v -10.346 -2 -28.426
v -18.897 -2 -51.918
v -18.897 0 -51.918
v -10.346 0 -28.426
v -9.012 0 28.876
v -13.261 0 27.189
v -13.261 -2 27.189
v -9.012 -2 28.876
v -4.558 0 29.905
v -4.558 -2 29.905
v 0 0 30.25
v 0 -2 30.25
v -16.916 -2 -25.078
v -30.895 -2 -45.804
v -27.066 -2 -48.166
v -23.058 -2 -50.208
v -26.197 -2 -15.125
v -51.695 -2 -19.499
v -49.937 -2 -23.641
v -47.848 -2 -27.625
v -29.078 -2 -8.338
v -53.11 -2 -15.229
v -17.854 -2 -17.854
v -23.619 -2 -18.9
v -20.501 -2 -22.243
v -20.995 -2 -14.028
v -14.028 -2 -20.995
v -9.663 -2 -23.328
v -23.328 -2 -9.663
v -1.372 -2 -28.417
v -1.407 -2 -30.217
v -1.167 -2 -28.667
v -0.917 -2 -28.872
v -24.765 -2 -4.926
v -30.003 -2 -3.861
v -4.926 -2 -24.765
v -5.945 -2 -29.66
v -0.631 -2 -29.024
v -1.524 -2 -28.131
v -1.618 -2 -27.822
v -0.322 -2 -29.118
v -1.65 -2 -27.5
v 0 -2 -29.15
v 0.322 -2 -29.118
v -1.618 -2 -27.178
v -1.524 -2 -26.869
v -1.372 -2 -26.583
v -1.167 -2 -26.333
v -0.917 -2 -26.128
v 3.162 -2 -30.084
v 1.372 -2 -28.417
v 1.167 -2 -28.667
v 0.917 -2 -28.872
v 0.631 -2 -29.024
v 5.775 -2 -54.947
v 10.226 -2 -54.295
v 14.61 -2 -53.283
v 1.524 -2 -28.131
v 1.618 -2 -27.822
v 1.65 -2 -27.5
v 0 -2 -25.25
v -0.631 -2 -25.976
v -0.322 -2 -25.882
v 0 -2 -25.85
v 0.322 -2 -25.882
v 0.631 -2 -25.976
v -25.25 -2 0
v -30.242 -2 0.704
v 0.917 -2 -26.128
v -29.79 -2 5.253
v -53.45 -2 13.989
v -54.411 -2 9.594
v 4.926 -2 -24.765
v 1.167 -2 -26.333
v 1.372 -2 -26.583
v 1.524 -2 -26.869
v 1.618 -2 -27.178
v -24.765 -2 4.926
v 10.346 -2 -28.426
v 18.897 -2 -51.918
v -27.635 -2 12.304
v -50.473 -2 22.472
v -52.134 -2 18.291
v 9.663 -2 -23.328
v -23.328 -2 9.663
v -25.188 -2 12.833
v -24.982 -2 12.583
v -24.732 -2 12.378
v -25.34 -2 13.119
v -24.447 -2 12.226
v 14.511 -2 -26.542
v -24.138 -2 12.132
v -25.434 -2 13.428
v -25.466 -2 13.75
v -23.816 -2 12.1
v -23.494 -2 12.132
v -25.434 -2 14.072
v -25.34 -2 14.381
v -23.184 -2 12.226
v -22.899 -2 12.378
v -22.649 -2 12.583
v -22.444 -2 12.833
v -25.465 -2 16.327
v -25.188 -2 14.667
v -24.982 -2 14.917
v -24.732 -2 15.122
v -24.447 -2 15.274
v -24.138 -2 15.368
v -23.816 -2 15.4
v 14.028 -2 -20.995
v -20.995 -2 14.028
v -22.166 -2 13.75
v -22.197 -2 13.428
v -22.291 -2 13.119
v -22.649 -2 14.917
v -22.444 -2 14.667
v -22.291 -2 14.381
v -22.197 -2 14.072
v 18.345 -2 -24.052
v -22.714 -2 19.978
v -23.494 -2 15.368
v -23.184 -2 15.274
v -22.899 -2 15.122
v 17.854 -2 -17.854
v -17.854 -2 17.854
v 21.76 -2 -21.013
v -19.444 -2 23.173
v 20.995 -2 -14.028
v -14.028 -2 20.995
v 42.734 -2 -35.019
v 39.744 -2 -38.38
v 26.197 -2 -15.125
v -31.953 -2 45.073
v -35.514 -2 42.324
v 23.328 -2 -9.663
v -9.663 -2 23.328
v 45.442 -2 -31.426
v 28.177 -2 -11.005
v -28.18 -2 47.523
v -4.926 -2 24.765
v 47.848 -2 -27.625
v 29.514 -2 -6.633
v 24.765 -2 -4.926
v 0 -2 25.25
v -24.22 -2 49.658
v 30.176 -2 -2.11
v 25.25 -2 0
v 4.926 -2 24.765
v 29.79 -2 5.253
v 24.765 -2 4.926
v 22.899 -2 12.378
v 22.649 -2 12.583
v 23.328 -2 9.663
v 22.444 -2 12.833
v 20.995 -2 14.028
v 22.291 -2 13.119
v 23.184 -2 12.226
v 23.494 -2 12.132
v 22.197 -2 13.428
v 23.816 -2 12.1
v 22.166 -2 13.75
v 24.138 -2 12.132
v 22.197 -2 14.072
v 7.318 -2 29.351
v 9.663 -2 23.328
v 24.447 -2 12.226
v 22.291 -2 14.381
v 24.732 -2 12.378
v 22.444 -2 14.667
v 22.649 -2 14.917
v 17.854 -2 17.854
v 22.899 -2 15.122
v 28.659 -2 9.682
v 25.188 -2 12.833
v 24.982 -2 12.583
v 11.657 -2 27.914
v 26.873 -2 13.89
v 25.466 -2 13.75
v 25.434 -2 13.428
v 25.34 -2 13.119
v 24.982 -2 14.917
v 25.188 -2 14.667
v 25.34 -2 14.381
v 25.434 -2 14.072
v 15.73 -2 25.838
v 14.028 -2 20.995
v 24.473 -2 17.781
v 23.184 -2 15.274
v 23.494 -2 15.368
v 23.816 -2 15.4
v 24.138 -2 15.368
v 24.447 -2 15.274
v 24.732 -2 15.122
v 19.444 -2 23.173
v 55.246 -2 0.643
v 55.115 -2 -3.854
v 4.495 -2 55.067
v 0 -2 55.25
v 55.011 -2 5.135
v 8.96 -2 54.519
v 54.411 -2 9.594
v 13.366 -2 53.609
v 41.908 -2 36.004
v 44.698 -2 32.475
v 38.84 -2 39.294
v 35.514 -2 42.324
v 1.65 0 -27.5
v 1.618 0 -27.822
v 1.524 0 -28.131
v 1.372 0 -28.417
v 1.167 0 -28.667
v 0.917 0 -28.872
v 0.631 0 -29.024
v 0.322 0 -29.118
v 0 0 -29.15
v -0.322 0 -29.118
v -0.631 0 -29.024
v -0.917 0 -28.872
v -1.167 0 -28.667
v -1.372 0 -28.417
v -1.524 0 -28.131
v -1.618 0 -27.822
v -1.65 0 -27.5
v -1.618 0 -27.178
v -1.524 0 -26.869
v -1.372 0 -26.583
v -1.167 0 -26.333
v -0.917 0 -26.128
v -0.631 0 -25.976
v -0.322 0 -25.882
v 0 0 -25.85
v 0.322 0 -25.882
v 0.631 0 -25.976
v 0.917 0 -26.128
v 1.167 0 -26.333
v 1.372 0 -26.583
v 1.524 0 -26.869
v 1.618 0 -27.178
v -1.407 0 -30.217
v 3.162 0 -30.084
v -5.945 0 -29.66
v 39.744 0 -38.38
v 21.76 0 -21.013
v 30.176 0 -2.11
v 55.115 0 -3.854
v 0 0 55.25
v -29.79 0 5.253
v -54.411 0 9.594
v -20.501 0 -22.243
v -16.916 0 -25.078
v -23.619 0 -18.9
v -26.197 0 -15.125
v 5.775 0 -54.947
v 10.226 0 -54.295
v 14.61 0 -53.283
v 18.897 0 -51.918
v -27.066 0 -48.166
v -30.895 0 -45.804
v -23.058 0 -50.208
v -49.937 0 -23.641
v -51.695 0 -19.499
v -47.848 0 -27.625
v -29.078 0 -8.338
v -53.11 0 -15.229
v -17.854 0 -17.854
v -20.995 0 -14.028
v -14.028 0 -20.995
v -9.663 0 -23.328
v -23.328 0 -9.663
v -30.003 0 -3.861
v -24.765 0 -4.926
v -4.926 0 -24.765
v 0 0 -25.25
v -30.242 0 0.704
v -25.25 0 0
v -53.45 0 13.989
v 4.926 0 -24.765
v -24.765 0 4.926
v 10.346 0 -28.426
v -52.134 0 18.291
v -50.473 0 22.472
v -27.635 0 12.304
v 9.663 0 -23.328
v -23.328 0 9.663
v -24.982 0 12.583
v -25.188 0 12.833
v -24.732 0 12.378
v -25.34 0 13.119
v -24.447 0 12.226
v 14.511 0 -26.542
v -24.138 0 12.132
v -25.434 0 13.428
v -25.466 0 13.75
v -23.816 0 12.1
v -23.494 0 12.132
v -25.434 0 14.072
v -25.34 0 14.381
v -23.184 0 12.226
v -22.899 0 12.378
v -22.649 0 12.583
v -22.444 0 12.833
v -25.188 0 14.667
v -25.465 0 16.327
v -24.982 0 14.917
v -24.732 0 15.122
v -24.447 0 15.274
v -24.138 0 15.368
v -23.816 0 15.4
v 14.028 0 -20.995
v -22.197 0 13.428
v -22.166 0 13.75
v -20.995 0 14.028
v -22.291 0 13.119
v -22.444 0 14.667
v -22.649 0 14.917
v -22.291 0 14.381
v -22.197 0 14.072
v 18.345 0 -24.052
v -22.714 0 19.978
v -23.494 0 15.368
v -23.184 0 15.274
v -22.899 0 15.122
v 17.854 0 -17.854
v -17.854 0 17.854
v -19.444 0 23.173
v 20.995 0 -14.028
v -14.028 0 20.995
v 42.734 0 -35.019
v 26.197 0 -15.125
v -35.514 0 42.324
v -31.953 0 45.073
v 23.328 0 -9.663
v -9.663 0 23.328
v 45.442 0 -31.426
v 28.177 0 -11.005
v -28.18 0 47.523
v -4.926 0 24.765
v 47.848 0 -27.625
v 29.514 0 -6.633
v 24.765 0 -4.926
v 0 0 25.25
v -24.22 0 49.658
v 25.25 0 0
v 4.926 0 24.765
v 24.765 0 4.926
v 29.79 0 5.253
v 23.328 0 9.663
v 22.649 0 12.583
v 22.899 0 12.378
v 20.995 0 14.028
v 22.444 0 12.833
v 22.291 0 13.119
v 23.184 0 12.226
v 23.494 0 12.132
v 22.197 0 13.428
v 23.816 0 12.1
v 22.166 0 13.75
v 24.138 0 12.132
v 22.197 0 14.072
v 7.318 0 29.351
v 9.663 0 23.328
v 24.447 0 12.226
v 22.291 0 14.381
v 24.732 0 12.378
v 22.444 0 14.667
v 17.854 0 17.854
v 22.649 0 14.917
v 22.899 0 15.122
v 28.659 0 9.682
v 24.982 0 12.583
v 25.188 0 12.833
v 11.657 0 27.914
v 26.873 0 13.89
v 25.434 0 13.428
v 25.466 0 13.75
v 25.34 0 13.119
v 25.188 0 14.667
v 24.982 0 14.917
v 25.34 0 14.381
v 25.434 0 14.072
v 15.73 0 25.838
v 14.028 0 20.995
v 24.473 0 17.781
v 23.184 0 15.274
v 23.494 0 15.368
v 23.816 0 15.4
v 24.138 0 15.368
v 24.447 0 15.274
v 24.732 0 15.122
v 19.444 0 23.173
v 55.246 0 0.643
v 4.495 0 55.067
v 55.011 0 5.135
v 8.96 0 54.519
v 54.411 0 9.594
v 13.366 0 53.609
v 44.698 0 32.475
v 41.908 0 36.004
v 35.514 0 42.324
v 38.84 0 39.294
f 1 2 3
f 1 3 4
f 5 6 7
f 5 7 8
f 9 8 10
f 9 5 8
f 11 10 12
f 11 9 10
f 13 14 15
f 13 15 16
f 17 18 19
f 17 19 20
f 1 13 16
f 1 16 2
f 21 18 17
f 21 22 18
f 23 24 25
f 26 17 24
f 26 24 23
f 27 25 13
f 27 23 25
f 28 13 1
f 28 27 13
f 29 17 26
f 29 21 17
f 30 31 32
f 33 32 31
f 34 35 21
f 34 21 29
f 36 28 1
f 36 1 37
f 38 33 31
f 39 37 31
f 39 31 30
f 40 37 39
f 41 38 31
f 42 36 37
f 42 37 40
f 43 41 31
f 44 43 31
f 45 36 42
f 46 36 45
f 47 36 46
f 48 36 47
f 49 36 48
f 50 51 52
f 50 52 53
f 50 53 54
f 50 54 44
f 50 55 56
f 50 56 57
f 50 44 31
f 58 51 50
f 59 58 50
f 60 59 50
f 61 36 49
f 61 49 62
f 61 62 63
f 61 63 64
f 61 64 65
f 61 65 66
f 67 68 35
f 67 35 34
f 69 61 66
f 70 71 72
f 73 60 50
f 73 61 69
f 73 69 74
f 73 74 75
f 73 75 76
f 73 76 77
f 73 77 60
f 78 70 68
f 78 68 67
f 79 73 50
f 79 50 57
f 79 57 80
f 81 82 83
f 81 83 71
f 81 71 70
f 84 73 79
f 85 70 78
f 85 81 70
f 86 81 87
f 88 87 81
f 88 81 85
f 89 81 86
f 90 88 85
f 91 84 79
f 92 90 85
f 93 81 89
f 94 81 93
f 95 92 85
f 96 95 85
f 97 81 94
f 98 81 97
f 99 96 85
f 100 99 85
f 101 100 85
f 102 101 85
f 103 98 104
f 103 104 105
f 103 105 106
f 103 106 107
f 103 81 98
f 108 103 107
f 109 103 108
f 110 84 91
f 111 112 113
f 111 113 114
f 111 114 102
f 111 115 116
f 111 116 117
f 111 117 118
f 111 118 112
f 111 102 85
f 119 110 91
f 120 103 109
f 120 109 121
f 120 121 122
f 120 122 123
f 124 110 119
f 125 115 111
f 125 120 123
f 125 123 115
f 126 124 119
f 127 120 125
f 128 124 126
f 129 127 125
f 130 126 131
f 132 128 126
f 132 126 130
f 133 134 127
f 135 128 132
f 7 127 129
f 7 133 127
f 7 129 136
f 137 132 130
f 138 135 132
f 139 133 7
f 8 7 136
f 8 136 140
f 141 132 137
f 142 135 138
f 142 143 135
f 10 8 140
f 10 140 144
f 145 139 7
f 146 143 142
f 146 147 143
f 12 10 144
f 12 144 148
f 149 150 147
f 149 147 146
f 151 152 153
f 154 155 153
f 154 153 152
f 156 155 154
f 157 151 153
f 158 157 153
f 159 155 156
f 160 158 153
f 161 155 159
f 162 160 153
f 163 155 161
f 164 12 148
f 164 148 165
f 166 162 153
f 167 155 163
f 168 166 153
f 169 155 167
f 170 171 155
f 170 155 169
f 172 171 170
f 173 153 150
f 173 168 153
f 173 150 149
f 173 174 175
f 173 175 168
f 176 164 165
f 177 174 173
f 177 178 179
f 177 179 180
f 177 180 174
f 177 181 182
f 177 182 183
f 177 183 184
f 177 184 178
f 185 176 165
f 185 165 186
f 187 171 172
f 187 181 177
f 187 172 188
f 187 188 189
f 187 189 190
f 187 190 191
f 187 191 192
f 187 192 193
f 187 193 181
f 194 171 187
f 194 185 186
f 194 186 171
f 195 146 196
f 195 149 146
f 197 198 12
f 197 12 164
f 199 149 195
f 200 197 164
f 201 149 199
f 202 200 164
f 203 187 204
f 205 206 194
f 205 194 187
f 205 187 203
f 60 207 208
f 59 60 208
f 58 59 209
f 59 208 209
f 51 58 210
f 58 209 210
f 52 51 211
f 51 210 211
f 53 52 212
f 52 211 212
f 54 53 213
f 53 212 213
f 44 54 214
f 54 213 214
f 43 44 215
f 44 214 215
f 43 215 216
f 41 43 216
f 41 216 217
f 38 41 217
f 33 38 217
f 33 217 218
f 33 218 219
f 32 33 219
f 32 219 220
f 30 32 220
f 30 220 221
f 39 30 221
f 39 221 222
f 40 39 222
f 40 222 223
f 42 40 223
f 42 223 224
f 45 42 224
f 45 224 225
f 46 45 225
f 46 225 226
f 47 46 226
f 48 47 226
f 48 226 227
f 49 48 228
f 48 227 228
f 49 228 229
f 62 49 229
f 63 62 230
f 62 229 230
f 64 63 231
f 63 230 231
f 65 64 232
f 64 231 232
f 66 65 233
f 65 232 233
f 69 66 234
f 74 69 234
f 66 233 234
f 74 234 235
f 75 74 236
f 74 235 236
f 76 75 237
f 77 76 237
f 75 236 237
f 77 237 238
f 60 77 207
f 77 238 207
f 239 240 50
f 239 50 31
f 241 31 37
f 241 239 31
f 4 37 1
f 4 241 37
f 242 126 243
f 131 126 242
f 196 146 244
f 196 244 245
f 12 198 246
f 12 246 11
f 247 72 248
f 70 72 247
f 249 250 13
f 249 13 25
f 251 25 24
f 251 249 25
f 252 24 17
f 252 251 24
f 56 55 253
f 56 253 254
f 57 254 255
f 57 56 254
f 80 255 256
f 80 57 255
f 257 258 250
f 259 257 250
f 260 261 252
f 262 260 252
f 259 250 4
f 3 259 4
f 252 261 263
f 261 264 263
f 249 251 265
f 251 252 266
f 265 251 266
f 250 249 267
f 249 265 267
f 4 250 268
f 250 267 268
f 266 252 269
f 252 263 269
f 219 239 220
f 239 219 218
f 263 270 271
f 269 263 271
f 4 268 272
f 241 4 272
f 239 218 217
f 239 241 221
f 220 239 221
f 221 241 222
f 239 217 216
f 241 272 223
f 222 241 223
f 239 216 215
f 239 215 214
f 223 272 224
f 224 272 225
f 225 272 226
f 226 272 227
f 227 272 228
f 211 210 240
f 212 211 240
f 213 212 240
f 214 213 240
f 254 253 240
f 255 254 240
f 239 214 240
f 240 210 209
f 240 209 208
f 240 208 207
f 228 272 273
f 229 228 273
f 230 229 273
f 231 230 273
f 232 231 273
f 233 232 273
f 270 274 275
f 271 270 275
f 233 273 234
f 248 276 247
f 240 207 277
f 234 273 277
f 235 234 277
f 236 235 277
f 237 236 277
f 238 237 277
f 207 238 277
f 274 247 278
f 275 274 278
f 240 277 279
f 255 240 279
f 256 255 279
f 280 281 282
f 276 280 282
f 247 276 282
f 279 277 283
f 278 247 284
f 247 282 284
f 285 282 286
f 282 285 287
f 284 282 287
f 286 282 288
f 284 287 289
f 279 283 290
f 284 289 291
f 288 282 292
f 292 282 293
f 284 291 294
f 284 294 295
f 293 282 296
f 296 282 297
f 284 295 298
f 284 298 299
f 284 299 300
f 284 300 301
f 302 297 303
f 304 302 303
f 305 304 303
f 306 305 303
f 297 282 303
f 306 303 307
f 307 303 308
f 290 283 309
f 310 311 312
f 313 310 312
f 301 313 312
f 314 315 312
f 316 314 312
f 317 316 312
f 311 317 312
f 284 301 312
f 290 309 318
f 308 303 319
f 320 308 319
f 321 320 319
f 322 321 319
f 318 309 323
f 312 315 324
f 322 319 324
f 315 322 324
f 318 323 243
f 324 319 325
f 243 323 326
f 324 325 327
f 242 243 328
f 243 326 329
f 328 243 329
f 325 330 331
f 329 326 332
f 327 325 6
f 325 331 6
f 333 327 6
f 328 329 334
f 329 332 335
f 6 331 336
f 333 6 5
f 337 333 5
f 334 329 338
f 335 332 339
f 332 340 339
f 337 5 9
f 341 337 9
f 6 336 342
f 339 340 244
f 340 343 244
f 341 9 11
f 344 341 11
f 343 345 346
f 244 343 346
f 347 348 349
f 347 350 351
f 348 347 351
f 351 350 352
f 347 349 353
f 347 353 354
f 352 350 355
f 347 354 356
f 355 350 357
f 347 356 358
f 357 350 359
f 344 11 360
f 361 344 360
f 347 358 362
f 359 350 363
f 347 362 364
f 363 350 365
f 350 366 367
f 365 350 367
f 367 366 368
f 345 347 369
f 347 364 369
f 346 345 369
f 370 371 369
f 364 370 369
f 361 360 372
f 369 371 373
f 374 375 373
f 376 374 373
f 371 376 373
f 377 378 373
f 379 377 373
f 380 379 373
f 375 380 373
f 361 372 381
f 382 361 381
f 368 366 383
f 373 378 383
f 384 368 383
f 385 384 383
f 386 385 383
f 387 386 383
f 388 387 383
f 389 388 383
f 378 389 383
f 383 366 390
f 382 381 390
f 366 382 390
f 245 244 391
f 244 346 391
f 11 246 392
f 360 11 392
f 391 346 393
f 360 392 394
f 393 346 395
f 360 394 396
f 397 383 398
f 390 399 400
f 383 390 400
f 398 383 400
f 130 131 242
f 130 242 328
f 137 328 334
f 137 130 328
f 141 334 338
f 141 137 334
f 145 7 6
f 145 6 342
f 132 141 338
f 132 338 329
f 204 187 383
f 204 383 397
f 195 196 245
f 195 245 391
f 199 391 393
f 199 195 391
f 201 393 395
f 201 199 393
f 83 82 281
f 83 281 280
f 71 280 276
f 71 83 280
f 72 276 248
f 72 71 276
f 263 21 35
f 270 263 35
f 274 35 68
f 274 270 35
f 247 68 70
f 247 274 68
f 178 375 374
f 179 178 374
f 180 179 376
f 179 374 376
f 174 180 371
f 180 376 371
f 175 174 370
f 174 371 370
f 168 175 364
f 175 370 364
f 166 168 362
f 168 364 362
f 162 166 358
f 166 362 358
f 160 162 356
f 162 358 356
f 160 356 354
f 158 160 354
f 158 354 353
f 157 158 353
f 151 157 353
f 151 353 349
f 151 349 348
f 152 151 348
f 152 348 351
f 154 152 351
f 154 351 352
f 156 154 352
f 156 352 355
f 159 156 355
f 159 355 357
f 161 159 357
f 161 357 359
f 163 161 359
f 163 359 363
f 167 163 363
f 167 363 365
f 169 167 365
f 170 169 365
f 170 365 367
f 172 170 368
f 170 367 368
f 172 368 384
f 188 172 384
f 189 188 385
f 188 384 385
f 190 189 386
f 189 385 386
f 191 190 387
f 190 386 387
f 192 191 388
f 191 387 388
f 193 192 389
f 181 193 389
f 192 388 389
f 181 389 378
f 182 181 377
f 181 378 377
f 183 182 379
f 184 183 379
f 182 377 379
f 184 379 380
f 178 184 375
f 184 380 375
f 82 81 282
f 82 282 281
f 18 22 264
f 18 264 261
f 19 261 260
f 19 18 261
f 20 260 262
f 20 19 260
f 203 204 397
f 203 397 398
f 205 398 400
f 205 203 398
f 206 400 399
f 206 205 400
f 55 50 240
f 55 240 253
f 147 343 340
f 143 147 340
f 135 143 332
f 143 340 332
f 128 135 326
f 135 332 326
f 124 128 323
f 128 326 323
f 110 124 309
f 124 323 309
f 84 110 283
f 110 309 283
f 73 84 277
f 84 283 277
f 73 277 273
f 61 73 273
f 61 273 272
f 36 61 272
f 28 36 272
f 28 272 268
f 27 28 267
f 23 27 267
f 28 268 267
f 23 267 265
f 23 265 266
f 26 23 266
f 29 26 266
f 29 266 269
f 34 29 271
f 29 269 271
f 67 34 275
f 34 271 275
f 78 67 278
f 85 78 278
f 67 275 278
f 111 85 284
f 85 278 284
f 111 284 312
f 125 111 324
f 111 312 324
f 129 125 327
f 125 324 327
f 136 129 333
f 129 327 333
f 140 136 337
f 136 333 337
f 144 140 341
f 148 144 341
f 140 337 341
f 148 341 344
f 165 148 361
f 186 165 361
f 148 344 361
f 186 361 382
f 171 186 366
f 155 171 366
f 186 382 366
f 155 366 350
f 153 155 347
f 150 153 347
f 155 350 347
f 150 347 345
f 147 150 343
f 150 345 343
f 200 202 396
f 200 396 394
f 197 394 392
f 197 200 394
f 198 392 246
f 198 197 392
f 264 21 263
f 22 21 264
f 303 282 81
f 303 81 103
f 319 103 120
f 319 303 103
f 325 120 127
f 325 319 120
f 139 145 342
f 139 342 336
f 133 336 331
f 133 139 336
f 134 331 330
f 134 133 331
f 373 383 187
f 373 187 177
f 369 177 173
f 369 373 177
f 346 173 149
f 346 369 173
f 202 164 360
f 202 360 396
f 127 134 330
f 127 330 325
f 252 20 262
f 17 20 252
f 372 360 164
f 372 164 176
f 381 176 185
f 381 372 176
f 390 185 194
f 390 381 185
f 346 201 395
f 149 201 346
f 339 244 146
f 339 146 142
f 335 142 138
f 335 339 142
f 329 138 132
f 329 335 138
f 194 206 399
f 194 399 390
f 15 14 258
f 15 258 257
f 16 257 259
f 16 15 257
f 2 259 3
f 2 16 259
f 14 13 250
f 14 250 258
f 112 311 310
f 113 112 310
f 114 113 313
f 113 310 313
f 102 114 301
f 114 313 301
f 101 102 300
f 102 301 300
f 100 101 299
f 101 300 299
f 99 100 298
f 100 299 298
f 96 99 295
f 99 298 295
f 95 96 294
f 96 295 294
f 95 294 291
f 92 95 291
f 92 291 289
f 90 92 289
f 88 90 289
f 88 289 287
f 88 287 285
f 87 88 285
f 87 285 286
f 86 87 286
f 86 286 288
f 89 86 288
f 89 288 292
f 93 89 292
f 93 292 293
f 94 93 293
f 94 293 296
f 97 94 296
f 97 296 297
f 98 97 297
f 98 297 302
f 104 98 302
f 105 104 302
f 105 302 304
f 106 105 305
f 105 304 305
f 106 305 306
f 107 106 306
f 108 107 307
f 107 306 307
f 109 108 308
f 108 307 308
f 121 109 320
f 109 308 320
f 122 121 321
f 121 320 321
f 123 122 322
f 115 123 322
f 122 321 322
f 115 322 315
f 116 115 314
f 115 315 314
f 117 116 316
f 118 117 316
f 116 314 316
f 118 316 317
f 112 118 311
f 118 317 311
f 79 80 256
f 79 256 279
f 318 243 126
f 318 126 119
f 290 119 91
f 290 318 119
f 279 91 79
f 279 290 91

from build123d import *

# Parameters (mm, degrees)
SKETCH1_R           = 30.25
SKETCH1_R_2         = 25.25
EXTRUDE_THIN1_DEPTH = 2
SKETCH2_R           = 1.65
CUT_EXTRUDE3_DEPTH  = 10
BOSS_EXTRUDE1_DEPTH = 2


with BuildPart() as part:
    # Sketch1 → Extrude-Thin1 (new body)
    with BuildSketch(Plane(origin=(0, 0, 0), x_dir=(1, 0, 0), z_dir=(0, 1, 0))):
        Circle(SKETCH1_R)
        Circle(SKETCH1_R_2, mode=Mode.SUBTRACT)
    extrude(amount=-EXTRUDE_THIN1_DEPTH)

    # Sketch2 → Cut-Extrude3 (cut)
    with BuildSketch(Plane(origin=(0, 0, 0), x_dir=(1, 0, 0), z_dir=(0, 1, 0))):
        with Locations((0, 27.5)):
            Circle(SKETCH2_R)
        with Locations((23.815698604, -13.75)):
            Circle(SKETCH2_R)
        with Locations((-23.815698604, -13.75)):
            Circle(SKETCH2_R)
    extrude(amount=-CUT_EXTRUDE3_DEPTH, mode=Mode.SUBTRACT)

    # Sketch5 → Boss-Extrude1 (add)
    with BuildSketch(Plane.XZ.offset(2)):
        with BuildLine():
            Line((0, 55.25), (0, 30.25))
            ThreePointArc((0, 30.25), (3.686547638, 30.024521087), (7.318137342, 29.35144572))
            Line((7.318137342, 29.35144572), (13.366184732, 53.608838877))
            ThreePointArc((13.366184732, 53.608838877), (6.733281223, 54.838174878), (0, 55.25))
        make_face()
        with BuildLine():
            Line((35.514015435, 42.323955482), (19.444325193, 23.172844404))
            ThreePointArc((19.444325193, 23.172844404), (22.123449474, 20.630450392), (24.47276408, 17.780503882))
            Line((24.47276408, 17.780503882), (44.698188939, 32.475135189))
            ThreePointArc((44.698188939, 32.475135189), (40.407292014, 37.680409393), (35.514015435, 42.323955482))
        make_face()
        with BuildLine():
            Line((54.410628354, 9.594061816), (29.790434529, 5.252857374))
            ThreePointArc((29.790434529, 5.252857374), (30.208543426, 1.583162676), (30.17631252, -2.110133331))
            Line((30.17631252, -2.110133331), (55.115413777, -3.854045174))
            ThreePointArc((55.115413777, -3.854045174), (55.174281795, 2.891561582), (54.410628354, 9.594061816))
        make_face()
        with BuildLine():
            Line((47.847903559, -27.625), (26.197268464, -15.125))
            ThreePointArc((26.197268464, -15.125), (24.158724179, -18.20490445), (21.76002896, -21.013415706))
            Line((21.76002896, -21.013415706), (39.743523969, -38.379874968))
            ThreePointArc((39.743523969, -38.379874968), (44.12461193, -33.250280029), (47.847903559, -27.625))
        make_face()
        with BuildLine():
            Line((18.896612919, -51.918017298), (10.346109336, -28.425701779))
            ThreePointArc((10.346109336, -28.425701779), (6.804769394, -29.47469446), (3.161986014, -30.084287335))
            Line((3.161986014, -30.084287335), (5.775197596, -54.947334719))
            ThreePointArc((5.775197596, -54.947334719), (12.428545752, -53.833946079), (18.896612919, -51.918017298))
        make_face()
        with BuildLine():
            Line((-18.896612919, -51.918017298), (-10.346109336, -28.425701779))
            ThreePointArc((-10.346109336, -28.425701779), (-13.733212617, -26.952947357), (-16.91558533, -25.07838657))
            Line((-16.91558533, -25.07838657), (-30.895407917, -45.804325884))
            ThreePointArc((-30.895407917, -45.804325884), (-25.082975111, -49.228110461), (-18.896612919, -51.918017298))
        make_face()
        with BuildLine():
            Line((-47.847903559, -27.625), (-26.197268464, -15.125))
            ThreePointArc((-26.197268464, -15.125), (-27.845271817, -11.819616637), (-29.078166302, -8.338030013))
            Line((-29.078166302, -8.338030013), (-53.109708701, -15.228963909))
            ThreePointArc((-53.109708701, -15.228963909), (-50.857893153, -21.587894849), (-47.847903559, -27.625))
        make_face()
        with BuildLine():
            Line((-54.410628354, 9.594061816), (-29.790434529, 5.252857374))
            ThreePointArc((-29.790434529, 5.252857374), (-28.928218868, 8.844244068), (-27.634750094, 12.303783453))
            Line((-27.634750094, 12.303783453), (-50.473386535, 22.47219953))
            ThreePointArc((-50.473386535, 22.47219953), (-52.835837767, 16.153536686), (-54.410628354, 9.594061816))
        make_face()
        with BuildLine():
            Line((-35.514015435, 42.323955482), (-19.444325193, 23.172844404))
            ThreePointArc((-19.444325193, 23.172844404), (-16.475330809, 25.36978468), (-13.26072719, 27.188519901))
            Line((-13.26072719, 27.188519901), (-24.22000586, 49.658371058))
            ThreePointArc((-24.22000586, 49.658371058), (-30.091306685, 46.336548879), (-35.514015435, 42.323955482))
        make_face()
    extrude(amount=-BOSS_EXTRUDE1_DEPTH)


solid = part.part
